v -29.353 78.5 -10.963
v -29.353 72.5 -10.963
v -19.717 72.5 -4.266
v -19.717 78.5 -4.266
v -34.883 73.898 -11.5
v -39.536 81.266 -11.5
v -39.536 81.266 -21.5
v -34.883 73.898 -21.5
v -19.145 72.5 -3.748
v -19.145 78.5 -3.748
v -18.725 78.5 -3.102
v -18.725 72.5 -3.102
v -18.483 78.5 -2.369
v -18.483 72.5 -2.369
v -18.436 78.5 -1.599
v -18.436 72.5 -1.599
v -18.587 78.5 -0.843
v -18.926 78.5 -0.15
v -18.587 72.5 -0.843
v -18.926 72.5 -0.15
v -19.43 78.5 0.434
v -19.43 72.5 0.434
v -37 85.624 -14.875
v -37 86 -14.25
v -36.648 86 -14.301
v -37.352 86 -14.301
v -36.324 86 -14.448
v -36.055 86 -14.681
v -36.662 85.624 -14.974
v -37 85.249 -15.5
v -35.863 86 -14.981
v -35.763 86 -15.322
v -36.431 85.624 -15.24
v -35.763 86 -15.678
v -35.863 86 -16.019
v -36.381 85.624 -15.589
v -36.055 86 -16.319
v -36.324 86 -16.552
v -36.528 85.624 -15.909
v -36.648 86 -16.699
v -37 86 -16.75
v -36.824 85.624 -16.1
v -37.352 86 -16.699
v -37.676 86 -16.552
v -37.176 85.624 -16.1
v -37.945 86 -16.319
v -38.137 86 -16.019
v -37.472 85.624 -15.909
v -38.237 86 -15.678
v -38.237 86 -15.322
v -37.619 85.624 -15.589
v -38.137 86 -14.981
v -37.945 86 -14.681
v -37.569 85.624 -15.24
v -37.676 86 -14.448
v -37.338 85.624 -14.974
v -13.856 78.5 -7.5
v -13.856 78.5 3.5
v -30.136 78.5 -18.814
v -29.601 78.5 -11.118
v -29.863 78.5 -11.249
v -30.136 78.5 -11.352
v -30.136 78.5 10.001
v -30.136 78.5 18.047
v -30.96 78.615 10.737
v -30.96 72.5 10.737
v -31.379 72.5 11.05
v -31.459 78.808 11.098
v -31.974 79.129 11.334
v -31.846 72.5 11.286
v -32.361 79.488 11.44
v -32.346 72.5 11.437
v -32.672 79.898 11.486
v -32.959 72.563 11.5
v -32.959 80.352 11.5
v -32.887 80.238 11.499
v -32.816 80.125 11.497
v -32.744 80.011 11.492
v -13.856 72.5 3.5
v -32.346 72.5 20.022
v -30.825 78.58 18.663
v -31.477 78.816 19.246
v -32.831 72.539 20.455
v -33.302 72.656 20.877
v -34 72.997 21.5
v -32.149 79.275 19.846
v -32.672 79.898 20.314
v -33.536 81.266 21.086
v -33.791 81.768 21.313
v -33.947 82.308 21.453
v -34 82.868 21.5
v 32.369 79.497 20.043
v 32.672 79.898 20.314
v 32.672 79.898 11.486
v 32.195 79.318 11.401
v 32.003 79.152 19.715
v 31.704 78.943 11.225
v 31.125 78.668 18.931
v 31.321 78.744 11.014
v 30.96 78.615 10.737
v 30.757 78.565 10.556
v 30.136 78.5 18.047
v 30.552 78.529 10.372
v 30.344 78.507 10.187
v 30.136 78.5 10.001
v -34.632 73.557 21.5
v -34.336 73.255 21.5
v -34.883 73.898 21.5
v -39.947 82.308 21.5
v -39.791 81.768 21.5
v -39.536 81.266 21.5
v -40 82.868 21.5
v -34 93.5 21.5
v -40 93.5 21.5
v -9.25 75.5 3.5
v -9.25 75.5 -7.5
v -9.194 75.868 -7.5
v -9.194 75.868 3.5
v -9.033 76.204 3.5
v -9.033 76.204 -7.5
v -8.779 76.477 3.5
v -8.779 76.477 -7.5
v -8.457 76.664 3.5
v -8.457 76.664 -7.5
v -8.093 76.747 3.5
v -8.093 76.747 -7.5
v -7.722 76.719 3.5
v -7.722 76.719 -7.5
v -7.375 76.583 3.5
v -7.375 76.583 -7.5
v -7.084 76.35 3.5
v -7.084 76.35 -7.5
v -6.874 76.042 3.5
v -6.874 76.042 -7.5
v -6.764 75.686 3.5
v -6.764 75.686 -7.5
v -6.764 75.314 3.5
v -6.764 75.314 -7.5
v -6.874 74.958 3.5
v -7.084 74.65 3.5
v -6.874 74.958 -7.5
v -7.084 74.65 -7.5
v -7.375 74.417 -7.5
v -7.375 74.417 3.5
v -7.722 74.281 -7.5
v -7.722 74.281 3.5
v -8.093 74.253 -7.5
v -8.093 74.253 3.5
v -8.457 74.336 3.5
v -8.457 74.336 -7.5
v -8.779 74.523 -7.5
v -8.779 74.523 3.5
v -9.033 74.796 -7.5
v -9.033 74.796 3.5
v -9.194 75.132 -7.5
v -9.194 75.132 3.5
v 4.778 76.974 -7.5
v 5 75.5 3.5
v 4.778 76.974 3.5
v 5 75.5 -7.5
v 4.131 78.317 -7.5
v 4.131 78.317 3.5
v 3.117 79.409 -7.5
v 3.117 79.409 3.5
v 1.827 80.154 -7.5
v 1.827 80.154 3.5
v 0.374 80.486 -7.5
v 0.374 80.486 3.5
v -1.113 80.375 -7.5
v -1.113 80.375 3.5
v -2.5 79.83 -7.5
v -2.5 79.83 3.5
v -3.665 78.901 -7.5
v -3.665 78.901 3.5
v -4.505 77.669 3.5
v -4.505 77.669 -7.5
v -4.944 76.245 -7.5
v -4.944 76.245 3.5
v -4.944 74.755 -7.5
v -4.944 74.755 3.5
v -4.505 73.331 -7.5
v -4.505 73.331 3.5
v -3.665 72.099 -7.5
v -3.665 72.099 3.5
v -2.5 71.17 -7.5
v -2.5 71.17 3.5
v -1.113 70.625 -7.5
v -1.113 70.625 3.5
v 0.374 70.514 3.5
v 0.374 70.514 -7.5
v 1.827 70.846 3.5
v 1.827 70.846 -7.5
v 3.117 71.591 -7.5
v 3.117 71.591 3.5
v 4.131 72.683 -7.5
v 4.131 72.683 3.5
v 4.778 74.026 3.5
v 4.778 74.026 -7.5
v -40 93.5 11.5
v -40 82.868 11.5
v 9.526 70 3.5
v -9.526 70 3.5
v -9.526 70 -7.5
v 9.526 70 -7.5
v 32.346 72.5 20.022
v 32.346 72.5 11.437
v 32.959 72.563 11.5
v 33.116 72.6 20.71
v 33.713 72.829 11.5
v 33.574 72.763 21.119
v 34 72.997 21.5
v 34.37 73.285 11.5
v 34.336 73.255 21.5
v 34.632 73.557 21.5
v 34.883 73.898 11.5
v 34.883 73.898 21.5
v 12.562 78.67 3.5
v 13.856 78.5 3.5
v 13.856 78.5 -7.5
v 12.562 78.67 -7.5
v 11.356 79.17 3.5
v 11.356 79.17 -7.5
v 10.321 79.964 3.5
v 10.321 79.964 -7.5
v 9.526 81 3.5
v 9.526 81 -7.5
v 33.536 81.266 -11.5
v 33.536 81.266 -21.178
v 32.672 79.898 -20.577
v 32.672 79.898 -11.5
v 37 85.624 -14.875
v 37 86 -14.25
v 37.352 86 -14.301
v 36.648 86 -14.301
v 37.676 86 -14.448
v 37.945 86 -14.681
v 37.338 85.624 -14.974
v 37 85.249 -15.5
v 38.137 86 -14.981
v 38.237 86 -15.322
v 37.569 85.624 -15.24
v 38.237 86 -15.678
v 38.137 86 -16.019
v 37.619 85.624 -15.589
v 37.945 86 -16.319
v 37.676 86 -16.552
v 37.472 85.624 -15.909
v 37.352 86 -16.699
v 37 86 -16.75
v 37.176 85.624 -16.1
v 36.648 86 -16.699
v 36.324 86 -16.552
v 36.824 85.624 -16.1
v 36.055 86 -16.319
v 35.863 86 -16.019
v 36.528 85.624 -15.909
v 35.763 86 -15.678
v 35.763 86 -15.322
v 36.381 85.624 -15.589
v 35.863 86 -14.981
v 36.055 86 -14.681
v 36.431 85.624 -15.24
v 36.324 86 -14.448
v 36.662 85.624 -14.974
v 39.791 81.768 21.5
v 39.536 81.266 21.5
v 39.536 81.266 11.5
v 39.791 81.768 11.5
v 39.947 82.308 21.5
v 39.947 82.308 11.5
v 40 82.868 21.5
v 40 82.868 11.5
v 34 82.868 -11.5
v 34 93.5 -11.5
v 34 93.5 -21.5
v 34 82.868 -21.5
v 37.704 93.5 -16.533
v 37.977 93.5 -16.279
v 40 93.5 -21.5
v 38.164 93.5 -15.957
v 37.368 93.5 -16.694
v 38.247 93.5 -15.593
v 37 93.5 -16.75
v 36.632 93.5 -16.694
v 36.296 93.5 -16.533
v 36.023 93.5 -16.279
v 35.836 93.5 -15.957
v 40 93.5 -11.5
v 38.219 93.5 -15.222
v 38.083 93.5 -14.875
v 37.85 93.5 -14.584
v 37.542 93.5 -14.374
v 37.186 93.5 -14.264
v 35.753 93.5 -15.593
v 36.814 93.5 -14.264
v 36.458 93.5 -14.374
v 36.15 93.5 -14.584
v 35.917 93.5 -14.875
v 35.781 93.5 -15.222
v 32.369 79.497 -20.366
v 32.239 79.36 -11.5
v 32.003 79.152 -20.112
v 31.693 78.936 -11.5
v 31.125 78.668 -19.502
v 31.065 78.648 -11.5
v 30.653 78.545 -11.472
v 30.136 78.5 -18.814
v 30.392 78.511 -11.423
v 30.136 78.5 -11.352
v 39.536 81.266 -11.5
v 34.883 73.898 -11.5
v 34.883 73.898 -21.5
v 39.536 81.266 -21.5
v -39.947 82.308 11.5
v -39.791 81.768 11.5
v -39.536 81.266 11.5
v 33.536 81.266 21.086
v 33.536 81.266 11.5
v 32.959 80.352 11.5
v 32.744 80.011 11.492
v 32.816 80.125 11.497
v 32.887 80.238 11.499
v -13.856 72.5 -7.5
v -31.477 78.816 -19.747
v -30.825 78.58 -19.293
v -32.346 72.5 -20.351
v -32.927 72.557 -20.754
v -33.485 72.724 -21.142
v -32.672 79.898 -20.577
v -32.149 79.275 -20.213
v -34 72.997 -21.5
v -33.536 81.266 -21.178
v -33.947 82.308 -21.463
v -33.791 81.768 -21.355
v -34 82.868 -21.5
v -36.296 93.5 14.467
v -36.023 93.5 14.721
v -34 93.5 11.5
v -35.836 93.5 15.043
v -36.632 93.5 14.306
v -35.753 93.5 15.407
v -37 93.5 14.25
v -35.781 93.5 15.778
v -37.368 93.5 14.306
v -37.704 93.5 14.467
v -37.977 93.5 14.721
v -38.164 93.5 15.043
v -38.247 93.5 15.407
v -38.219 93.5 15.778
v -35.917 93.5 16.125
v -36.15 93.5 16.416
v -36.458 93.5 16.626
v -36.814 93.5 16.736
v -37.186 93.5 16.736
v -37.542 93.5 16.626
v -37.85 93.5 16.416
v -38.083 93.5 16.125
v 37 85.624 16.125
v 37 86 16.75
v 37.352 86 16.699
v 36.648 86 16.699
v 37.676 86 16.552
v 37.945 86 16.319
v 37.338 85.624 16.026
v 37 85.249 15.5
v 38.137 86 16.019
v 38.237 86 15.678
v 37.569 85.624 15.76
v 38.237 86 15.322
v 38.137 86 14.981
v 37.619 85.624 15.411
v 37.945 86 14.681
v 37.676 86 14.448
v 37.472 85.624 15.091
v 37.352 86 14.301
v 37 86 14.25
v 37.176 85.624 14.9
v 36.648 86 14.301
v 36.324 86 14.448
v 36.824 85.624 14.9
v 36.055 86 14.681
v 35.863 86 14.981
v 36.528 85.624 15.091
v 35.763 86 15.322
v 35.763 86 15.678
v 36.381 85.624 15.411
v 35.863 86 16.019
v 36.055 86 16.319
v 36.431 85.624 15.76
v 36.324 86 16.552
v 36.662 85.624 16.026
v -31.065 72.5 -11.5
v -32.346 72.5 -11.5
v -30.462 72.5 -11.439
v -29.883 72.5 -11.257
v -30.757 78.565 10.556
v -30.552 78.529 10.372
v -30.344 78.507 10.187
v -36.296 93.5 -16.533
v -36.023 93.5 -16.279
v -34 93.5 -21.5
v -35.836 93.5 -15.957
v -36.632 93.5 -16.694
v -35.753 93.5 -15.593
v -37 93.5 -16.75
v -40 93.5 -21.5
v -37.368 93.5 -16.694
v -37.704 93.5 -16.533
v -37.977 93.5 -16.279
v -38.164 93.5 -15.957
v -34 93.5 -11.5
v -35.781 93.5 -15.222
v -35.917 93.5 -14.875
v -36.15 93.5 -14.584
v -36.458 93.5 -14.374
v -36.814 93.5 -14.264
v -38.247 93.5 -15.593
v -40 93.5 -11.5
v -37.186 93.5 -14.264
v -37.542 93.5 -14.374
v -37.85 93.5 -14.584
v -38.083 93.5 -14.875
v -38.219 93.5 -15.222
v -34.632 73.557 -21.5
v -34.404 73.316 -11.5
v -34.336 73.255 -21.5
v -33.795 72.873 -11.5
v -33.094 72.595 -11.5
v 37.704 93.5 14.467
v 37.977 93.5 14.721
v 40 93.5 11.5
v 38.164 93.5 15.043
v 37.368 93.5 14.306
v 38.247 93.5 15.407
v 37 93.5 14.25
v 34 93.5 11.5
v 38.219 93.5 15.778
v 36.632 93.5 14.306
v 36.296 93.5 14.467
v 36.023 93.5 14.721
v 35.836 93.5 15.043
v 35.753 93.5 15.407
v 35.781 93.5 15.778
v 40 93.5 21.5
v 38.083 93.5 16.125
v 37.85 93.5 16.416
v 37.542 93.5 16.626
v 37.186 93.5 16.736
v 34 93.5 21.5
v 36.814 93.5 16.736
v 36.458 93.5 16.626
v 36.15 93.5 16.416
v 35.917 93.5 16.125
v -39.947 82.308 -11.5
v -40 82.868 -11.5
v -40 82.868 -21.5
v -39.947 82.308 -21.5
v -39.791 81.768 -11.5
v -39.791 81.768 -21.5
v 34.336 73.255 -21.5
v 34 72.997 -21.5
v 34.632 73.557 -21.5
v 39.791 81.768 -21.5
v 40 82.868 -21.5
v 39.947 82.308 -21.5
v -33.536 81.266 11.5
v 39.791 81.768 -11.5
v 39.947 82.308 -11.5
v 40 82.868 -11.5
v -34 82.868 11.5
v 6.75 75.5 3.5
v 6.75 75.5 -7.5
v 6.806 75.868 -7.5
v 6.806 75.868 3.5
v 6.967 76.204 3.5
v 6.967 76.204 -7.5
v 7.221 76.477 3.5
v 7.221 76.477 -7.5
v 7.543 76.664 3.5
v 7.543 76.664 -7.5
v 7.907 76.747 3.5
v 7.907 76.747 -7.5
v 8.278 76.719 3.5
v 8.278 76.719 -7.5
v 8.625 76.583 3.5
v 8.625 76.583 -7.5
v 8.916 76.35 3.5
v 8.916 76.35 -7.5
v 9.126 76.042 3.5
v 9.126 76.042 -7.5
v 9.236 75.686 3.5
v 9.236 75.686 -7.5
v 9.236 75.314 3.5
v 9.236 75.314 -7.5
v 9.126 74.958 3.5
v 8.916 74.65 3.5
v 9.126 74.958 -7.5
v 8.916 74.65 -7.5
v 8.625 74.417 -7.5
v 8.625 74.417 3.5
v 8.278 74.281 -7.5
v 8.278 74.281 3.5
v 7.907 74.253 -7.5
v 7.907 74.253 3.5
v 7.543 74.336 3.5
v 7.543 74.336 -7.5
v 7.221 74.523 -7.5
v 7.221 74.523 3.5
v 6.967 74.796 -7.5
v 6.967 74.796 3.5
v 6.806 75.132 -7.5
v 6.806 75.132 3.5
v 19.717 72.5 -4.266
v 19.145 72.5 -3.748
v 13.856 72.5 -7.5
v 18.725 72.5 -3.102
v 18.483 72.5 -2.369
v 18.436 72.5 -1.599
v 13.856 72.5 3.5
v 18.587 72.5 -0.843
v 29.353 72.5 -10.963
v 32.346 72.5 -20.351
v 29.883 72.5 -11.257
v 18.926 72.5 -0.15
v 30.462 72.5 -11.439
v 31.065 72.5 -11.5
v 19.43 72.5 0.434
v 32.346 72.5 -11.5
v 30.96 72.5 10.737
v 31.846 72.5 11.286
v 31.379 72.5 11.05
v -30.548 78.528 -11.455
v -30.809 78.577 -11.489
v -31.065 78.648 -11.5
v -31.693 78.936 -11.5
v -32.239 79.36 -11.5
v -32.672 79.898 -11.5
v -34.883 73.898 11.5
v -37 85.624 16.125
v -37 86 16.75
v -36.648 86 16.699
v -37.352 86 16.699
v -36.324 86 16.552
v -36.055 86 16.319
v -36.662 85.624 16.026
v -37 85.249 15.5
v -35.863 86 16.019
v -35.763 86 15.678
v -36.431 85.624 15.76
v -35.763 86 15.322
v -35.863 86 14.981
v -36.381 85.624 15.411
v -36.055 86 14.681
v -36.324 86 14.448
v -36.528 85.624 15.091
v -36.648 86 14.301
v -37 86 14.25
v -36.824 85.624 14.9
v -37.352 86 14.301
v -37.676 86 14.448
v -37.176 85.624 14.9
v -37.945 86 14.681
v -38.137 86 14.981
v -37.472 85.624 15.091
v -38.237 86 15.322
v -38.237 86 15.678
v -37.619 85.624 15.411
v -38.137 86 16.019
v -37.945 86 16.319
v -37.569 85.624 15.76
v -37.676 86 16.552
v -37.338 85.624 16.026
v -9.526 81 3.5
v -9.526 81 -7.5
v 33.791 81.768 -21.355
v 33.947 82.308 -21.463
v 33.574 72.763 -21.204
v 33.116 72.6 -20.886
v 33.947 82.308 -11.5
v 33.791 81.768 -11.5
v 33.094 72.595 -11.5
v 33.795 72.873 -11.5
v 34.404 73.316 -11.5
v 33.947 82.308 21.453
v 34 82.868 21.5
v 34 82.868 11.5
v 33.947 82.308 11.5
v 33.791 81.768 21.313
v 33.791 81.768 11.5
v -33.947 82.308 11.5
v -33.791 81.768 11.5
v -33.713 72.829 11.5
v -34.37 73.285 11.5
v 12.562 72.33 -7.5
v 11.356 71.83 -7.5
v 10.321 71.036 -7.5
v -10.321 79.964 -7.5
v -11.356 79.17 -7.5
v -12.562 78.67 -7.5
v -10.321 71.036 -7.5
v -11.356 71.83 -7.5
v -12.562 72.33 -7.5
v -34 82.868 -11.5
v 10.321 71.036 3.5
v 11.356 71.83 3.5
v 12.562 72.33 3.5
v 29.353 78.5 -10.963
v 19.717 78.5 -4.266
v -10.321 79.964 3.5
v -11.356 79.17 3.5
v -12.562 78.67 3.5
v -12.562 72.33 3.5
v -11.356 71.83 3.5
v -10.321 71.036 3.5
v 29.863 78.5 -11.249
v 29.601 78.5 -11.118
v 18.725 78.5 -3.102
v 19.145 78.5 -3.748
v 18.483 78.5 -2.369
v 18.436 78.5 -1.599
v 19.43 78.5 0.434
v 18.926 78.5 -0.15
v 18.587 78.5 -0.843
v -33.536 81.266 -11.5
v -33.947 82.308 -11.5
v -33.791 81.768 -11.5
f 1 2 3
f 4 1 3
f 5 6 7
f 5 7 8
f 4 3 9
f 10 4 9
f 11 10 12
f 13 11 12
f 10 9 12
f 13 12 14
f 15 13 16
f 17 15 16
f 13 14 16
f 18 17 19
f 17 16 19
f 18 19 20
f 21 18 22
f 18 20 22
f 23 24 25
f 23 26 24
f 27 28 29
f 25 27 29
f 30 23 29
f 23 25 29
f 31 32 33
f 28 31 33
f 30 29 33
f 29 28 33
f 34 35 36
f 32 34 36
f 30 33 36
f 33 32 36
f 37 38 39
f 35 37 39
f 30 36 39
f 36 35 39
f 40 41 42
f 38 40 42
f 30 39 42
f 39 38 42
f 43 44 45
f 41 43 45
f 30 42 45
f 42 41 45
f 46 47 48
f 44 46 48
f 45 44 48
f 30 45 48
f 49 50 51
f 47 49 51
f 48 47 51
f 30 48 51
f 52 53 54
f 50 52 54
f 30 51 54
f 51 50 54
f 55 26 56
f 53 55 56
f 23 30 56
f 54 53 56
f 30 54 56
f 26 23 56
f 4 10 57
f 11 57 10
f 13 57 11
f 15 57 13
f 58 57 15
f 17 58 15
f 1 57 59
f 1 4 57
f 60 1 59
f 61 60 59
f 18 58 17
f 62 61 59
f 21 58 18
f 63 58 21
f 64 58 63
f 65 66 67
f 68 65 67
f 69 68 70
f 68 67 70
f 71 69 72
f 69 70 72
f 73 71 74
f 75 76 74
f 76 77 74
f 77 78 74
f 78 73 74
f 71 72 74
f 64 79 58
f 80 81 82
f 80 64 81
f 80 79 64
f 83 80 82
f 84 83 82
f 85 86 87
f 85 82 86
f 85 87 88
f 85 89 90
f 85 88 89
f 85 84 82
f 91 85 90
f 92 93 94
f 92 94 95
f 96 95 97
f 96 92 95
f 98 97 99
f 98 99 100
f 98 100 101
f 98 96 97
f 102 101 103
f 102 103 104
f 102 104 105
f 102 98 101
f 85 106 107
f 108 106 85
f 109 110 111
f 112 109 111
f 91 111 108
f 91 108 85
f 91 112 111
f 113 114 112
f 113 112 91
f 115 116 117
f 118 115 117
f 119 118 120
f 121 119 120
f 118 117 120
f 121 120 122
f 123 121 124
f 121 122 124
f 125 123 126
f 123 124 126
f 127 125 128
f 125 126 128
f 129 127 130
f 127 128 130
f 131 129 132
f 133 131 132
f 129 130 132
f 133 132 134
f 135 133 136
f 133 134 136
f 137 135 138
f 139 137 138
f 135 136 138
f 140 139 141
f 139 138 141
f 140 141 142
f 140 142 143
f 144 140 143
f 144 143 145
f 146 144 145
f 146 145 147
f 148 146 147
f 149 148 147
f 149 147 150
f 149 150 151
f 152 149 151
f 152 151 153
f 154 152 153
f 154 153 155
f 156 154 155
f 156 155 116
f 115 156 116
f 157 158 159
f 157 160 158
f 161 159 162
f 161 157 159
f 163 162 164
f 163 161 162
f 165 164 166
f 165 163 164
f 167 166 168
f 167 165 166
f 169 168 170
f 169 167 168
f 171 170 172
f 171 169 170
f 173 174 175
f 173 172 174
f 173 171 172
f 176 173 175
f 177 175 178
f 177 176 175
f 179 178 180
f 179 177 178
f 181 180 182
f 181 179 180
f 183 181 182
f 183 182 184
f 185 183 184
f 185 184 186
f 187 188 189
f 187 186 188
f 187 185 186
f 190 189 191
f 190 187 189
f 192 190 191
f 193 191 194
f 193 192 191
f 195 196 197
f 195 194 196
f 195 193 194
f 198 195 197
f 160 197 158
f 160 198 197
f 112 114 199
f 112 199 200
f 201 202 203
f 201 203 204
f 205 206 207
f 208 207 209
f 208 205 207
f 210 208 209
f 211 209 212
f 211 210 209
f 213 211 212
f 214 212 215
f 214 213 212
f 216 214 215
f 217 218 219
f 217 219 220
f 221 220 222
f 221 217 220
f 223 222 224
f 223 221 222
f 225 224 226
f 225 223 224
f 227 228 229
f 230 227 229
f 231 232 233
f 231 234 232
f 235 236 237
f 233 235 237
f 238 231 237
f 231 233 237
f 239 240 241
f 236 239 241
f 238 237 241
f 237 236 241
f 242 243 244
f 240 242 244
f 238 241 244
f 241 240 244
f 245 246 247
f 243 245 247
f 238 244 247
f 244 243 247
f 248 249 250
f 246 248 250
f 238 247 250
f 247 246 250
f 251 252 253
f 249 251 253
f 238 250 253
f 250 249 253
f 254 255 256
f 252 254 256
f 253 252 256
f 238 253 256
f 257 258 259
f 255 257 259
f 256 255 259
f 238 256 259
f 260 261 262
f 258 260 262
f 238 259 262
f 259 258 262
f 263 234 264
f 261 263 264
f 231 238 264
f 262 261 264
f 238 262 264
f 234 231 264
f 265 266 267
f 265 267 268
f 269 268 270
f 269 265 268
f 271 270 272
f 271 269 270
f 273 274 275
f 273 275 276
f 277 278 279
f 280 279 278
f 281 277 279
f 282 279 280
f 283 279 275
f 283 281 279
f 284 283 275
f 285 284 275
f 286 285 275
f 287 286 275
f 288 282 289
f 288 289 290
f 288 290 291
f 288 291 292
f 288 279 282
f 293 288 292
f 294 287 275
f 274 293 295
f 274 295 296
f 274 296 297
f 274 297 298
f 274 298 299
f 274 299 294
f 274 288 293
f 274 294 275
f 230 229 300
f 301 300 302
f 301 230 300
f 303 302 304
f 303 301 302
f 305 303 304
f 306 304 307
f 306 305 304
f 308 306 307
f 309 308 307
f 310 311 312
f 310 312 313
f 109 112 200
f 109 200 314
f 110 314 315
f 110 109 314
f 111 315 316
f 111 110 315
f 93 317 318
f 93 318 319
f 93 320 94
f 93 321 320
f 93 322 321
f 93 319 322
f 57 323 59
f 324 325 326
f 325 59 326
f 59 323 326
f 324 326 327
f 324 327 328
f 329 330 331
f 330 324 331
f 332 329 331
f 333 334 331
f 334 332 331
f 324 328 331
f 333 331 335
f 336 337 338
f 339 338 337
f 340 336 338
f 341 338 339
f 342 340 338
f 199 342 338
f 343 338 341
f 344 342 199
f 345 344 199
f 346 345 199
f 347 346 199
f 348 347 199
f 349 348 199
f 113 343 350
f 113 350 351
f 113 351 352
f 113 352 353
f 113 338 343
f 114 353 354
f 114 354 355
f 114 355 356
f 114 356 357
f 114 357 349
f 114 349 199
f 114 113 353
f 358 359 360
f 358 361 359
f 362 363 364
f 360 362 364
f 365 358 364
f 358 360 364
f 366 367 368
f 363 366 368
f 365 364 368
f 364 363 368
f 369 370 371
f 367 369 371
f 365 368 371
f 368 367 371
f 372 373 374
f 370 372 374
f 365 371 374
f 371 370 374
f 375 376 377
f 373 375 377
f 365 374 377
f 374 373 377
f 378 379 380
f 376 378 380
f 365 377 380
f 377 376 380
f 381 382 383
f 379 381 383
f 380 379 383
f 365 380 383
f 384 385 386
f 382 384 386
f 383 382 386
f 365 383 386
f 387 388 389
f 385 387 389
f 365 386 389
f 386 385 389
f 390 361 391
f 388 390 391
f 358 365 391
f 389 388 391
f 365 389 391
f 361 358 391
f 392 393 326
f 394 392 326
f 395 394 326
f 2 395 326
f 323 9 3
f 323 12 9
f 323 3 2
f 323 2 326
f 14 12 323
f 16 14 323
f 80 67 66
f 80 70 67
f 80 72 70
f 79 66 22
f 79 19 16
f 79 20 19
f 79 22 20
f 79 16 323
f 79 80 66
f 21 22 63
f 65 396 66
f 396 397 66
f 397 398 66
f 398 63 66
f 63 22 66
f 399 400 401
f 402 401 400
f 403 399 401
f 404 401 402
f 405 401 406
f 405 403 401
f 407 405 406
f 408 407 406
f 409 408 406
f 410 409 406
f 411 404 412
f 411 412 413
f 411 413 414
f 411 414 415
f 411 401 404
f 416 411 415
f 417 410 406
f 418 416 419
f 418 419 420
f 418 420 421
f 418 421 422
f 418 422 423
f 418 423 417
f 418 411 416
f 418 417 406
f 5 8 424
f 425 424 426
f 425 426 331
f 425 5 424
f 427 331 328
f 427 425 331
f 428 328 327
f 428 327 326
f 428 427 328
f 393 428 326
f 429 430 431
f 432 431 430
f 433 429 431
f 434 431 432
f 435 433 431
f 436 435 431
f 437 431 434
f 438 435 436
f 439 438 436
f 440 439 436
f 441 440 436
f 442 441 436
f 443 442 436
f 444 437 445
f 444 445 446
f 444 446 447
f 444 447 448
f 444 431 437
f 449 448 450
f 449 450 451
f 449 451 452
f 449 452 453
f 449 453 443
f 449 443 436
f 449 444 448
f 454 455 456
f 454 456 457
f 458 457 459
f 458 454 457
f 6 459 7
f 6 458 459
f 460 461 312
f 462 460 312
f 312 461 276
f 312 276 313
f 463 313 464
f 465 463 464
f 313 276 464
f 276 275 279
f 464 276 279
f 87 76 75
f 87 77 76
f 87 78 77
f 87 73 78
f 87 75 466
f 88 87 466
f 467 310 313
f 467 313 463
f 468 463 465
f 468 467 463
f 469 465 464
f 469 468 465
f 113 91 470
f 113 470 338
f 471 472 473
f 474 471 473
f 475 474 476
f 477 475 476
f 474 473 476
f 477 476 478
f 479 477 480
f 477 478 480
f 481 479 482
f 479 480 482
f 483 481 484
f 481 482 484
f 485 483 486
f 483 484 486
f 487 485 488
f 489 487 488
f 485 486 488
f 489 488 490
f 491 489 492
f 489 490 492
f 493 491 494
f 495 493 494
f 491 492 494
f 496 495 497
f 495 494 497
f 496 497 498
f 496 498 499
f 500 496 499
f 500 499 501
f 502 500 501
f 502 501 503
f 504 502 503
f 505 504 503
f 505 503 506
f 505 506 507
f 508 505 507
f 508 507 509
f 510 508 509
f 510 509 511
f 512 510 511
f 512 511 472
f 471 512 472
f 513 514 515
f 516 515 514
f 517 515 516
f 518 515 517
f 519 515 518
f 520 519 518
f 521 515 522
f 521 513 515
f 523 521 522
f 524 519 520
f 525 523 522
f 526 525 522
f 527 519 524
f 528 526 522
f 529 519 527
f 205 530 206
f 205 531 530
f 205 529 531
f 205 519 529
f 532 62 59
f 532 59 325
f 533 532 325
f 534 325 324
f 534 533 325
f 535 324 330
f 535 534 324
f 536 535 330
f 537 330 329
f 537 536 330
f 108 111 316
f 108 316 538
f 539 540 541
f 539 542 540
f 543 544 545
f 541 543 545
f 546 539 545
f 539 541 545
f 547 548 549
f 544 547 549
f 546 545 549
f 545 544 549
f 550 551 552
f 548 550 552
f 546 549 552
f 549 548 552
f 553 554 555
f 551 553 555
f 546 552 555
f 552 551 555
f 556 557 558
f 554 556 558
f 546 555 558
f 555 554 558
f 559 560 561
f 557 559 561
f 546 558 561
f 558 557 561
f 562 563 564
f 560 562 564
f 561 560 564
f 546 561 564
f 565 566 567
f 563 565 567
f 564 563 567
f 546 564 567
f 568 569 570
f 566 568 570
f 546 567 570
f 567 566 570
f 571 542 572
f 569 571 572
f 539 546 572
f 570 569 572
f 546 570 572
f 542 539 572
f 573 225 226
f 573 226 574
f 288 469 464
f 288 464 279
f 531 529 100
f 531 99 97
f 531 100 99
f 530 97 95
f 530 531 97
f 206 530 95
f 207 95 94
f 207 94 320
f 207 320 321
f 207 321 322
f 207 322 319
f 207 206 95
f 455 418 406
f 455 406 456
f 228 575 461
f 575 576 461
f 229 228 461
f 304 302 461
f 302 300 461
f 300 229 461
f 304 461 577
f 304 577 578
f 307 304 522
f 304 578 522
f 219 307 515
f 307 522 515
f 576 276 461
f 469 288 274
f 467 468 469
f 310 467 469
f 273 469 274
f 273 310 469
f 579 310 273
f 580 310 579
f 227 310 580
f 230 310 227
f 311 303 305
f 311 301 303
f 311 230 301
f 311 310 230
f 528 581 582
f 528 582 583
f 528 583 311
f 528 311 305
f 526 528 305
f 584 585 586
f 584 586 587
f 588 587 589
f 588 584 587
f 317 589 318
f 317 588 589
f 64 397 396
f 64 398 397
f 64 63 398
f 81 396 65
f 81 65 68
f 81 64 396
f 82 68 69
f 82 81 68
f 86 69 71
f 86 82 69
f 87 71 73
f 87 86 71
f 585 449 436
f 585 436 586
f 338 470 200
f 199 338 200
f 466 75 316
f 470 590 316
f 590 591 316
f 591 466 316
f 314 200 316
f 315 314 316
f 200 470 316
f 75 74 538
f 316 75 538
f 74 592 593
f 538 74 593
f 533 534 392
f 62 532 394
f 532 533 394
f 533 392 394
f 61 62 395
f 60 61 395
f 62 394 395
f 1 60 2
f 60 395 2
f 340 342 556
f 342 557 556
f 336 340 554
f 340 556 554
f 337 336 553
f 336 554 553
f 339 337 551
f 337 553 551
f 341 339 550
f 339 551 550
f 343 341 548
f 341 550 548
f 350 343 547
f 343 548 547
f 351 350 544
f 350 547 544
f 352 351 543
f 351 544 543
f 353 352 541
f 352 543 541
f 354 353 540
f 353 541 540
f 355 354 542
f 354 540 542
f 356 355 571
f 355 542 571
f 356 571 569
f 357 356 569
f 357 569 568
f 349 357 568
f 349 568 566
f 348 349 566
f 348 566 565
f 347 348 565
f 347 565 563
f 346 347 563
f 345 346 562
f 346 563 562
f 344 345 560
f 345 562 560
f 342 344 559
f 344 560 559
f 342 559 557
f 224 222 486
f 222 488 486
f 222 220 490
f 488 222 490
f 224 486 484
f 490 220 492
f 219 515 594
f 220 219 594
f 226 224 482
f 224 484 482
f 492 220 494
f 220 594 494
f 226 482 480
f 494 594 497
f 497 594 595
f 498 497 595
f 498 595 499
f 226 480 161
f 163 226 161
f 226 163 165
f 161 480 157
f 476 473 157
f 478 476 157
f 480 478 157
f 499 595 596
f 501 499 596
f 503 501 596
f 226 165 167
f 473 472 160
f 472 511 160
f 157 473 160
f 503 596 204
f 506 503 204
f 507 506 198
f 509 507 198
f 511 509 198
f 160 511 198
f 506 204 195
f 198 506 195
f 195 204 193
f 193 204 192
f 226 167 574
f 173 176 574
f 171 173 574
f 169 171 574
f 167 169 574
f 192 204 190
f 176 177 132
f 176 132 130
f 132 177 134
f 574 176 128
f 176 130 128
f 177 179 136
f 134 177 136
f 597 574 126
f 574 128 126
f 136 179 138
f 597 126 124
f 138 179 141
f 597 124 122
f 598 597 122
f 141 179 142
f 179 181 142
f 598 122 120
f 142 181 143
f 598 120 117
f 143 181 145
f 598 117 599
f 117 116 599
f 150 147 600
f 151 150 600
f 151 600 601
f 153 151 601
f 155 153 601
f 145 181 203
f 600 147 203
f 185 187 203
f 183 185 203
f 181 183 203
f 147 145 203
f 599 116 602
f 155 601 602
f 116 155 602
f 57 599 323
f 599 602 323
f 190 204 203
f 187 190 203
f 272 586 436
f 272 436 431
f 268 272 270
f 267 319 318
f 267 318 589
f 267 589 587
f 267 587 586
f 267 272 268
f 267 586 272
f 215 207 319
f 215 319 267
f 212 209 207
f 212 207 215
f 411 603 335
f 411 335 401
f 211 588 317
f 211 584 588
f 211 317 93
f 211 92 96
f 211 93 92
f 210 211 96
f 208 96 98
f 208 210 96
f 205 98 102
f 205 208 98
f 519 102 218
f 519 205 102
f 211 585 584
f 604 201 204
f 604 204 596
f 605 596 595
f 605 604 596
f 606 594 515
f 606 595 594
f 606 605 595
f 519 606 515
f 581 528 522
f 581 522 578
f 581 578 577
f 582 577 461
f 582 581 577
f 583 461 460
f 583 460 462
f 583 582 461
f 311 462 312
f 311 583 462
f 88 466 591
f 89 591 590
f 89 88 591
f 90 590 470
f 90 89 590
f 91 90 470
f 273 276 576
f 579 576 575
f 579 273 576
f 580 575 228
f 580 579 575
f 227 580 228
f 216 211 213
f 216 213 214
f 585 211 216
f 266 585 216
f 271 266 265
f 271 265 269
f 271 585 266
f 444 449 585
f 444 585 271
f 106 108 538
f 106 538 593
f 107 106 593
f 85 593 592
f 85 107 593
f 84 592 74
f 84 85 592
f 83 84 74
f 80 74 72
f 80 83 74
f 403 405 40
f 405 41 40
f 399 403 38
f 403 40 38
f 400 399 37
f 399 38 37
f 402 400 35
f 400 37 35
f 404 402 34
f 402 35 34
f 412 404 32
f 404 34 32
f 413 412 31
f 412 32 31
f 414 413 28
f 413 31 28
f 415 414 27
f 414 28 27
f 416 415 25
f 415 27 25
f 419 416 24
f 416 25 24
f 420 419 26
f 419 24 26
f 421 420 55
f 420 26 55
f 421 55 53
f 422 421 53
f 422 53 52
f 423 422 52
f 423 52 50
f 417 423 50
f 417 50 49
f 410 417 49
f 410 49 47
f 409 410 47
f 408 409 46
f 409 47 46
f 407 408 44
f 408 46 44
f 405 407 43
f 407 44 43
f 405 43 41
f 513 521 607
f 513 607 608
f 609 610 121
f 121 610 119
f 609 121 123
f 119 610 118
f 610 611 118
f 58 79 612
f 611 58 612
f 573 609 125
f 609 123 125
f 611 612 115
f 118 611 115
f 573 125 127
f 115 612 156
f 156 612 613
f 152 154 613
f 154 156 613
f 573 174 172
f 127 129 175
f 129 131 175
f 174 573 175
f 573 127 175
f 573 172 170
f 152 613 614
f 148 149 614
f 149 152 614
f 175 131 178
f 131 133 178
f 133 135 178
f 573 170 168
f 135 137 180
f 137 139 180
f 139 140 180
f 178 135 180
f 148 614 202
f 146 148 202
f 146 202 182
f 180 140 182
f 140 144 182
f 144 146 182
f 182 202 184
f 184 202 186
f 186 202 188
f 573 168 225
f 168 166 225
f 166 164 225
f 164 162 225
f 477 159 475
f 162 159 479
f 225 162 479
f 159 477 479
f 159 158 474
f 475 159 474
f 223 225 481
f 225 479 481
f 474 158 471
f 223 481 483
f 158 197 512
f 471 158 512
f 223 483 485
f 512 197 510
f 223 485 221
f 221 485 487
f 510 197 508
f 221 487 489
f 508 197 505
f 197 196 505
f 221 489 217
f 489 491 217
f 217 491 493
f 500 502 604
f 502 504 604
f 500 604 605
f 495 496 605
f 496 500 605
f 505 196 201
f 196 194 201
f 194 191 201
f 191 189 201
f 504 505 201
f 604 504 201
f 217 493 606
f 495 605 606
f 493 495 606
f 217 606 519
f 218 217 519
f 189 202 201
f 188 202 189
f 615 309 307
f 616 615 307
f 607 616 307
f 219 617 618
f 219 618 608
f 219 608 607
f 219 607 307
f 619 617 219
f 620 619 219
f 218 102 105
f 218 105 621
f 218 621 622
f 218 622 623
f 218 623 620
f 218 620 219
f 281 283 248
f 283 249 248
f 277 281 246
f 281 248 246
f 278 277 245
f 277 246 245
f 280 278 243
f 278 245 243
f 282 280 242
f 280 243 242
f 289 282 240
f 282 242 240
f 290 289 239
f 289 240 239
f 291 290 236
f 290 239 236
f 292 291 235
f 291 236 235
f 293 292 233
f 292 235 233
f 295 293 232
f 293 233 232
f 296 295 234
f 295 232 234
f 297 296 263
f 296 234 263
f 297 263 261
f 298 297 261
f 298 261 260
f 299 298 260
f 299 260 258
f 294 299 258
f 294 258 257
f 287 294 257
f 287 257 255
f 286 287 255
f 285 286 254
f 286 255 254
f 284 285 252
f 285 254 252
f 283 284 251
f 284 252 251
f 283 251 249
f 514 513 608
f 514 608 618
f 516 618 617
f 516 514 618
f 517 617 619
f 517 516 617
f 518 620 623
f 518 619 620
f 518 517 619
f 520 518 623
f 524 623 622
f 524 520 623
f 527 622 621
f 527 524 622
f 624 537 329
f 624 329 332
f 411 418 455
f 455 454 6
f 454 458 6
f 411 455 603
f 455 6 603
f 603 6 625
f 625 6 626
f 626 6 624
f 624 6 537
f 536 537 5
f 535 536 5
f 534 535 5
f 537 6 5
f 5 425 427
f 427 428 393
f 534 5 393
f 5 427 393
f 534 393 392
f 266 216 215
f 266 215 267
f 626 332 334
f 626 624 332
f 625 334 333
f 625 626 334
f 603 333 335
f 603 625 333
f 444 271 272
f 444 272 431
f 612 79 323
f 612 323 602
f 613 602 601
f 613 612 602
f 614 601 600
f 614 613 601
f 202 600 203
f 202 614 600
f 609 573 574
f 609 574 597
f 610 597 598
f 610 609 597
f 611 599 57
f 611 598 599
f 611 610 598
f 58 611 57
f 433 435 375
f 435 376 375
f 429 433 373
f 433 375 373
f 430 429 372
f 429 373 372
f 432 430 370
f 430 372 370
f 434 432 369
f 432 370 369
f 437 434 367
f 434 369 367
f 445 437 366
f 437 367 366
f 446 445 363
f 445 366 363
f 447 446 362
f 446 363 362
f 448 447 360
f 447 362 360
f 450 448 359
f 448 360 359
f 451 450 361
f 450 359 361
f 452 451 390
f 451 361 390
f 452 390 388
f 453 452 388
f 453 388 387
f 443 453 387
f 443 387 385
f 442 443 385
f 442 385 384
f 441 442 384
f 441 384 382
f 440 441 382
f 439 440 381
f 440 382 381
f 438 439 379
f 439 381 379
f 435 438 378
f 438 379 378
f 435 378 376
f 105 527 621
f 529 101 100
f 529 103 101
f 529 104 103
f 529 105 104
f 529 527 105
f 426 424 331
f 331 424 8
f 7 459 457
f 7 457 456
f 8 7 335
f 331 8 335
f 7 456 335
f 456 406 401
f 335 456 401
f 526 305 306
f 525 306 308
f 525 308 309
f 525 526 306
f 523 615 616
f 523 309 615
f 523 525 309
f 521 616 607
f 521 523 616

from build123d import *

# Parameters (mm, degrees)
SKETCH15_R            = 5
BOSS_EXTRUDE7_DEPTH   = 21.5
CUT_EXTRUDE6_DEPTH    = 52.132181647
CUT_EXTRUDE7_DEPTH    = 52.132181647
M3_TAPPED_HOLE1_D     = 2.5
M3_TAPPED_HOLE2_D     = 2.5
M3_TAPPED_HOLE2_DEPTH = 7.5
M3_TAPPED_HOLE2_TIP   = 0.751075774


with BuildPart() as part:
    # Sketch15 → Boss-Extrude7 (new, symmetric)
    with BuildSketch(Plane.XY):
        with BuildLine():
            Line((-9.526279442, 70), (9.526279442, 70))
            ThreePointArc((9.526279442, 70), (11.356406461, 71.830127019), (13.856406461, 72.5))
            Line((13.856406461, 72.5), (32.346493939, 72.5))
            ThreePointArc((32.346493939, 72.5), (33.794607035, 72.872649917), (34.882960648, 73.898021026))
            Line((34.882960648, 73.898021026), (39.536466709, 81.266072289))
            ThreePointArc((39.536466709, 81.266072289), (39.881787651, 82.034204793), (40, 82.868051264))
            Line((40, 82.868051264), (40, 93.5))
            Line((40, 93.5), (34, 93.5))
            Line((34, 93.5), (34, 82.868051264))
            ThreePointArc((34, 82.868051264), (33.881787651, 82.034204793), (33.536466709, 81.266072289))
            Line((33.536466709, 81.266072289), (32.672434332, 79.898021026))
            ThreePointArc((32.672434332, 79.898021026), (31.584080719, 78.872649917), (30.135967623, 78.5))
            Line((30.135967623, 78.5), (13.856406461, 78.5))
            ThreePointArc((13.856406461, 78.5), (11.356406461, 79.169872981), (9.526279442, 81))
            Line((9.526279442, 81), (-9.526279442, 81))
            ThreePointArc((-9.526279442, 81), (-11.356406461, 79.169872981), (-13.856406461, 78.5))
            Line((-13.856406461, 78.5), (-30.135967623, 78.5))
            ThreePointArc((-30.135967623, 78.5), (-31.584080719, 78.872649917), (-32.672434332, 79.898021026))
            Line((-32.672434332, 79.898021026), (-33.536466709, 81.266072289))
            ThreePointArc((-33.536466709, 81.266072289), (-33.881787651, 82.034204793), (-34, 82.868051264))
            Line((-34, 82.868051264), (-34, 93.5))
            Line((-34, 93.5), (-40, 93.5))
            Line((-40, 93.5), (-40, 82.868051264))
            ThreePointArc((-40, 82.868051264), (-39.881787651, 82.034204793), (-39.536466709, 81.266072289))
            Line((-39.536466709, 81.266072289), (-34.882960648, 73.898021026))
            ThreePointArc((-34.882960648, 73.898021026), (-33.794607035, 72.872649917), (-32.346493939, 72.5))
            Line((-32.346493939, 72.5), (-13.856406461, 72.5))
            ThreePointArc((-13.856406461, 72.5), (-11.356406461, 71.830127019), (-9.526279442, 70))
        make_face()
        with Locations((0, 75.5)):
            Circle(SKETCH15_R, mode=Mode.SUBTRACT)
    extrude(amount=BOSS_EXTRUDE7_DEPTH, both=True)

    # Sketch16 → Cut-Extrude6 (cut, through all)
    with BuildSketch(Plane.XZ.offset(-70)):
        Polygon((-9.526279442, 3.5), (-13.856406461, 3.5), (-34, 21.5), (34, 21.5), (13.856406461, 3.5), (9.526279442, 3.5), align=None)
        Polygon((-9.526279442, -7.5), (-13.856406461, -7.5), (-34, -21.5), (34, -21.5), (13.856406461, -7.5), (9.526279442, -7.5), align=None)
    extrude(amount=-CUT_EXTRUDE6_DEPTH, mode=Mode.SUBTRACT)

    # Sketch18 → Cut-Extrude7 (cut, through all)
    with BuildSketch(Plane.XZ.offset(-70)):
        with BuildLine():
            Line((-19.430135511, 0.434122818), (-30.959972352, 10.737004611))
            ThreePointArc((-30.959972352, 10.737004611), (-31.889114835, 11.302767724), (-32.95892467, 11.5))
            Line((-32.95892467, 11.5), (-40, 11.5))
            Line((-40, 11.5), (-40, -11.5))
            Line((-40, -11.5), (-31.065089761, -11.5))
            ThreePointArc((-31.065089761, -11.5), (-30.167975157, -11.362723421), (-29.352962435, -10.963456925))
            Line((-29.352962435, -10.963456925), (-19.716960503, -4.266338718))
            ThreePointArc((-19.716960503, -4.266338718), (-18.434657551, -1.985603731), (-19.430135511, 0.434122818))
        make_face()
        with BuildLine():
            Line((40, -11.5), (31.065089761, -11.5))
            ThreePointArc((31.065089761, -11.5), (30.167975157, -11.362723421), (29.352962435, -10.963456925))
            Line((29.352962435, -10.963456925), (19.716960503, -4.266338718))
            ThreePointArc((19.716960503, -4.266338718), (18.434657551, -1.985603731), (19.430135511, 0.434122818))
            Line((19.430135511, 0.434122818), (30.959972352, 10.737004611))
            ThreePointArc((30.959972352, 10.737004611), (31.889114835, 11.302767724), (32.95892467, 11.5))
            Line((32.95892467, 11.5), (40, 11.5))
            Line((40, 11.5), (40, -11.5))
        make_face()
    extrude(amount=-CUT_EXTRUDE7_DEPTH, mode=Mode.SUBTRACT)

    # M3 Tapped Hole1 (through all)
    with Locations(Plane(origin=(-8, 75.5, 3.5), x_dir=(1, 0, 0), z_dir=(0, 0, 1))):
        with Locations((0, 0), (16, 0)):
            Hole(M3_TAPPED_HOLE1_D / 2)

    # M3 Tapped Hole2
    with Locations(Plane(origin=(-37, 93.5, -15.5), x_dir=(0, 0, 1), z_dir=(0, 1, 0))):
        with Locations((0, 0), (0, 74), (31, 74), (31, 0)):
            Hole(M3_TAPPED_HOLE2_D / 2, depth=M3_TAPPED_HOLE2_DEPTH)
            with Locations((0, 0, -(M3_TAPPED_HOLE2_DEPTH + M3_TAPPED_HOLE2_TIP / 2))):  # 118° drill point
                Cone(0, M3_TAPPED_HOLE2_D / 2, M3_TAPPED_HOLE2_TIP, mode=Mode.SUBTRACT)


solid = part.part
